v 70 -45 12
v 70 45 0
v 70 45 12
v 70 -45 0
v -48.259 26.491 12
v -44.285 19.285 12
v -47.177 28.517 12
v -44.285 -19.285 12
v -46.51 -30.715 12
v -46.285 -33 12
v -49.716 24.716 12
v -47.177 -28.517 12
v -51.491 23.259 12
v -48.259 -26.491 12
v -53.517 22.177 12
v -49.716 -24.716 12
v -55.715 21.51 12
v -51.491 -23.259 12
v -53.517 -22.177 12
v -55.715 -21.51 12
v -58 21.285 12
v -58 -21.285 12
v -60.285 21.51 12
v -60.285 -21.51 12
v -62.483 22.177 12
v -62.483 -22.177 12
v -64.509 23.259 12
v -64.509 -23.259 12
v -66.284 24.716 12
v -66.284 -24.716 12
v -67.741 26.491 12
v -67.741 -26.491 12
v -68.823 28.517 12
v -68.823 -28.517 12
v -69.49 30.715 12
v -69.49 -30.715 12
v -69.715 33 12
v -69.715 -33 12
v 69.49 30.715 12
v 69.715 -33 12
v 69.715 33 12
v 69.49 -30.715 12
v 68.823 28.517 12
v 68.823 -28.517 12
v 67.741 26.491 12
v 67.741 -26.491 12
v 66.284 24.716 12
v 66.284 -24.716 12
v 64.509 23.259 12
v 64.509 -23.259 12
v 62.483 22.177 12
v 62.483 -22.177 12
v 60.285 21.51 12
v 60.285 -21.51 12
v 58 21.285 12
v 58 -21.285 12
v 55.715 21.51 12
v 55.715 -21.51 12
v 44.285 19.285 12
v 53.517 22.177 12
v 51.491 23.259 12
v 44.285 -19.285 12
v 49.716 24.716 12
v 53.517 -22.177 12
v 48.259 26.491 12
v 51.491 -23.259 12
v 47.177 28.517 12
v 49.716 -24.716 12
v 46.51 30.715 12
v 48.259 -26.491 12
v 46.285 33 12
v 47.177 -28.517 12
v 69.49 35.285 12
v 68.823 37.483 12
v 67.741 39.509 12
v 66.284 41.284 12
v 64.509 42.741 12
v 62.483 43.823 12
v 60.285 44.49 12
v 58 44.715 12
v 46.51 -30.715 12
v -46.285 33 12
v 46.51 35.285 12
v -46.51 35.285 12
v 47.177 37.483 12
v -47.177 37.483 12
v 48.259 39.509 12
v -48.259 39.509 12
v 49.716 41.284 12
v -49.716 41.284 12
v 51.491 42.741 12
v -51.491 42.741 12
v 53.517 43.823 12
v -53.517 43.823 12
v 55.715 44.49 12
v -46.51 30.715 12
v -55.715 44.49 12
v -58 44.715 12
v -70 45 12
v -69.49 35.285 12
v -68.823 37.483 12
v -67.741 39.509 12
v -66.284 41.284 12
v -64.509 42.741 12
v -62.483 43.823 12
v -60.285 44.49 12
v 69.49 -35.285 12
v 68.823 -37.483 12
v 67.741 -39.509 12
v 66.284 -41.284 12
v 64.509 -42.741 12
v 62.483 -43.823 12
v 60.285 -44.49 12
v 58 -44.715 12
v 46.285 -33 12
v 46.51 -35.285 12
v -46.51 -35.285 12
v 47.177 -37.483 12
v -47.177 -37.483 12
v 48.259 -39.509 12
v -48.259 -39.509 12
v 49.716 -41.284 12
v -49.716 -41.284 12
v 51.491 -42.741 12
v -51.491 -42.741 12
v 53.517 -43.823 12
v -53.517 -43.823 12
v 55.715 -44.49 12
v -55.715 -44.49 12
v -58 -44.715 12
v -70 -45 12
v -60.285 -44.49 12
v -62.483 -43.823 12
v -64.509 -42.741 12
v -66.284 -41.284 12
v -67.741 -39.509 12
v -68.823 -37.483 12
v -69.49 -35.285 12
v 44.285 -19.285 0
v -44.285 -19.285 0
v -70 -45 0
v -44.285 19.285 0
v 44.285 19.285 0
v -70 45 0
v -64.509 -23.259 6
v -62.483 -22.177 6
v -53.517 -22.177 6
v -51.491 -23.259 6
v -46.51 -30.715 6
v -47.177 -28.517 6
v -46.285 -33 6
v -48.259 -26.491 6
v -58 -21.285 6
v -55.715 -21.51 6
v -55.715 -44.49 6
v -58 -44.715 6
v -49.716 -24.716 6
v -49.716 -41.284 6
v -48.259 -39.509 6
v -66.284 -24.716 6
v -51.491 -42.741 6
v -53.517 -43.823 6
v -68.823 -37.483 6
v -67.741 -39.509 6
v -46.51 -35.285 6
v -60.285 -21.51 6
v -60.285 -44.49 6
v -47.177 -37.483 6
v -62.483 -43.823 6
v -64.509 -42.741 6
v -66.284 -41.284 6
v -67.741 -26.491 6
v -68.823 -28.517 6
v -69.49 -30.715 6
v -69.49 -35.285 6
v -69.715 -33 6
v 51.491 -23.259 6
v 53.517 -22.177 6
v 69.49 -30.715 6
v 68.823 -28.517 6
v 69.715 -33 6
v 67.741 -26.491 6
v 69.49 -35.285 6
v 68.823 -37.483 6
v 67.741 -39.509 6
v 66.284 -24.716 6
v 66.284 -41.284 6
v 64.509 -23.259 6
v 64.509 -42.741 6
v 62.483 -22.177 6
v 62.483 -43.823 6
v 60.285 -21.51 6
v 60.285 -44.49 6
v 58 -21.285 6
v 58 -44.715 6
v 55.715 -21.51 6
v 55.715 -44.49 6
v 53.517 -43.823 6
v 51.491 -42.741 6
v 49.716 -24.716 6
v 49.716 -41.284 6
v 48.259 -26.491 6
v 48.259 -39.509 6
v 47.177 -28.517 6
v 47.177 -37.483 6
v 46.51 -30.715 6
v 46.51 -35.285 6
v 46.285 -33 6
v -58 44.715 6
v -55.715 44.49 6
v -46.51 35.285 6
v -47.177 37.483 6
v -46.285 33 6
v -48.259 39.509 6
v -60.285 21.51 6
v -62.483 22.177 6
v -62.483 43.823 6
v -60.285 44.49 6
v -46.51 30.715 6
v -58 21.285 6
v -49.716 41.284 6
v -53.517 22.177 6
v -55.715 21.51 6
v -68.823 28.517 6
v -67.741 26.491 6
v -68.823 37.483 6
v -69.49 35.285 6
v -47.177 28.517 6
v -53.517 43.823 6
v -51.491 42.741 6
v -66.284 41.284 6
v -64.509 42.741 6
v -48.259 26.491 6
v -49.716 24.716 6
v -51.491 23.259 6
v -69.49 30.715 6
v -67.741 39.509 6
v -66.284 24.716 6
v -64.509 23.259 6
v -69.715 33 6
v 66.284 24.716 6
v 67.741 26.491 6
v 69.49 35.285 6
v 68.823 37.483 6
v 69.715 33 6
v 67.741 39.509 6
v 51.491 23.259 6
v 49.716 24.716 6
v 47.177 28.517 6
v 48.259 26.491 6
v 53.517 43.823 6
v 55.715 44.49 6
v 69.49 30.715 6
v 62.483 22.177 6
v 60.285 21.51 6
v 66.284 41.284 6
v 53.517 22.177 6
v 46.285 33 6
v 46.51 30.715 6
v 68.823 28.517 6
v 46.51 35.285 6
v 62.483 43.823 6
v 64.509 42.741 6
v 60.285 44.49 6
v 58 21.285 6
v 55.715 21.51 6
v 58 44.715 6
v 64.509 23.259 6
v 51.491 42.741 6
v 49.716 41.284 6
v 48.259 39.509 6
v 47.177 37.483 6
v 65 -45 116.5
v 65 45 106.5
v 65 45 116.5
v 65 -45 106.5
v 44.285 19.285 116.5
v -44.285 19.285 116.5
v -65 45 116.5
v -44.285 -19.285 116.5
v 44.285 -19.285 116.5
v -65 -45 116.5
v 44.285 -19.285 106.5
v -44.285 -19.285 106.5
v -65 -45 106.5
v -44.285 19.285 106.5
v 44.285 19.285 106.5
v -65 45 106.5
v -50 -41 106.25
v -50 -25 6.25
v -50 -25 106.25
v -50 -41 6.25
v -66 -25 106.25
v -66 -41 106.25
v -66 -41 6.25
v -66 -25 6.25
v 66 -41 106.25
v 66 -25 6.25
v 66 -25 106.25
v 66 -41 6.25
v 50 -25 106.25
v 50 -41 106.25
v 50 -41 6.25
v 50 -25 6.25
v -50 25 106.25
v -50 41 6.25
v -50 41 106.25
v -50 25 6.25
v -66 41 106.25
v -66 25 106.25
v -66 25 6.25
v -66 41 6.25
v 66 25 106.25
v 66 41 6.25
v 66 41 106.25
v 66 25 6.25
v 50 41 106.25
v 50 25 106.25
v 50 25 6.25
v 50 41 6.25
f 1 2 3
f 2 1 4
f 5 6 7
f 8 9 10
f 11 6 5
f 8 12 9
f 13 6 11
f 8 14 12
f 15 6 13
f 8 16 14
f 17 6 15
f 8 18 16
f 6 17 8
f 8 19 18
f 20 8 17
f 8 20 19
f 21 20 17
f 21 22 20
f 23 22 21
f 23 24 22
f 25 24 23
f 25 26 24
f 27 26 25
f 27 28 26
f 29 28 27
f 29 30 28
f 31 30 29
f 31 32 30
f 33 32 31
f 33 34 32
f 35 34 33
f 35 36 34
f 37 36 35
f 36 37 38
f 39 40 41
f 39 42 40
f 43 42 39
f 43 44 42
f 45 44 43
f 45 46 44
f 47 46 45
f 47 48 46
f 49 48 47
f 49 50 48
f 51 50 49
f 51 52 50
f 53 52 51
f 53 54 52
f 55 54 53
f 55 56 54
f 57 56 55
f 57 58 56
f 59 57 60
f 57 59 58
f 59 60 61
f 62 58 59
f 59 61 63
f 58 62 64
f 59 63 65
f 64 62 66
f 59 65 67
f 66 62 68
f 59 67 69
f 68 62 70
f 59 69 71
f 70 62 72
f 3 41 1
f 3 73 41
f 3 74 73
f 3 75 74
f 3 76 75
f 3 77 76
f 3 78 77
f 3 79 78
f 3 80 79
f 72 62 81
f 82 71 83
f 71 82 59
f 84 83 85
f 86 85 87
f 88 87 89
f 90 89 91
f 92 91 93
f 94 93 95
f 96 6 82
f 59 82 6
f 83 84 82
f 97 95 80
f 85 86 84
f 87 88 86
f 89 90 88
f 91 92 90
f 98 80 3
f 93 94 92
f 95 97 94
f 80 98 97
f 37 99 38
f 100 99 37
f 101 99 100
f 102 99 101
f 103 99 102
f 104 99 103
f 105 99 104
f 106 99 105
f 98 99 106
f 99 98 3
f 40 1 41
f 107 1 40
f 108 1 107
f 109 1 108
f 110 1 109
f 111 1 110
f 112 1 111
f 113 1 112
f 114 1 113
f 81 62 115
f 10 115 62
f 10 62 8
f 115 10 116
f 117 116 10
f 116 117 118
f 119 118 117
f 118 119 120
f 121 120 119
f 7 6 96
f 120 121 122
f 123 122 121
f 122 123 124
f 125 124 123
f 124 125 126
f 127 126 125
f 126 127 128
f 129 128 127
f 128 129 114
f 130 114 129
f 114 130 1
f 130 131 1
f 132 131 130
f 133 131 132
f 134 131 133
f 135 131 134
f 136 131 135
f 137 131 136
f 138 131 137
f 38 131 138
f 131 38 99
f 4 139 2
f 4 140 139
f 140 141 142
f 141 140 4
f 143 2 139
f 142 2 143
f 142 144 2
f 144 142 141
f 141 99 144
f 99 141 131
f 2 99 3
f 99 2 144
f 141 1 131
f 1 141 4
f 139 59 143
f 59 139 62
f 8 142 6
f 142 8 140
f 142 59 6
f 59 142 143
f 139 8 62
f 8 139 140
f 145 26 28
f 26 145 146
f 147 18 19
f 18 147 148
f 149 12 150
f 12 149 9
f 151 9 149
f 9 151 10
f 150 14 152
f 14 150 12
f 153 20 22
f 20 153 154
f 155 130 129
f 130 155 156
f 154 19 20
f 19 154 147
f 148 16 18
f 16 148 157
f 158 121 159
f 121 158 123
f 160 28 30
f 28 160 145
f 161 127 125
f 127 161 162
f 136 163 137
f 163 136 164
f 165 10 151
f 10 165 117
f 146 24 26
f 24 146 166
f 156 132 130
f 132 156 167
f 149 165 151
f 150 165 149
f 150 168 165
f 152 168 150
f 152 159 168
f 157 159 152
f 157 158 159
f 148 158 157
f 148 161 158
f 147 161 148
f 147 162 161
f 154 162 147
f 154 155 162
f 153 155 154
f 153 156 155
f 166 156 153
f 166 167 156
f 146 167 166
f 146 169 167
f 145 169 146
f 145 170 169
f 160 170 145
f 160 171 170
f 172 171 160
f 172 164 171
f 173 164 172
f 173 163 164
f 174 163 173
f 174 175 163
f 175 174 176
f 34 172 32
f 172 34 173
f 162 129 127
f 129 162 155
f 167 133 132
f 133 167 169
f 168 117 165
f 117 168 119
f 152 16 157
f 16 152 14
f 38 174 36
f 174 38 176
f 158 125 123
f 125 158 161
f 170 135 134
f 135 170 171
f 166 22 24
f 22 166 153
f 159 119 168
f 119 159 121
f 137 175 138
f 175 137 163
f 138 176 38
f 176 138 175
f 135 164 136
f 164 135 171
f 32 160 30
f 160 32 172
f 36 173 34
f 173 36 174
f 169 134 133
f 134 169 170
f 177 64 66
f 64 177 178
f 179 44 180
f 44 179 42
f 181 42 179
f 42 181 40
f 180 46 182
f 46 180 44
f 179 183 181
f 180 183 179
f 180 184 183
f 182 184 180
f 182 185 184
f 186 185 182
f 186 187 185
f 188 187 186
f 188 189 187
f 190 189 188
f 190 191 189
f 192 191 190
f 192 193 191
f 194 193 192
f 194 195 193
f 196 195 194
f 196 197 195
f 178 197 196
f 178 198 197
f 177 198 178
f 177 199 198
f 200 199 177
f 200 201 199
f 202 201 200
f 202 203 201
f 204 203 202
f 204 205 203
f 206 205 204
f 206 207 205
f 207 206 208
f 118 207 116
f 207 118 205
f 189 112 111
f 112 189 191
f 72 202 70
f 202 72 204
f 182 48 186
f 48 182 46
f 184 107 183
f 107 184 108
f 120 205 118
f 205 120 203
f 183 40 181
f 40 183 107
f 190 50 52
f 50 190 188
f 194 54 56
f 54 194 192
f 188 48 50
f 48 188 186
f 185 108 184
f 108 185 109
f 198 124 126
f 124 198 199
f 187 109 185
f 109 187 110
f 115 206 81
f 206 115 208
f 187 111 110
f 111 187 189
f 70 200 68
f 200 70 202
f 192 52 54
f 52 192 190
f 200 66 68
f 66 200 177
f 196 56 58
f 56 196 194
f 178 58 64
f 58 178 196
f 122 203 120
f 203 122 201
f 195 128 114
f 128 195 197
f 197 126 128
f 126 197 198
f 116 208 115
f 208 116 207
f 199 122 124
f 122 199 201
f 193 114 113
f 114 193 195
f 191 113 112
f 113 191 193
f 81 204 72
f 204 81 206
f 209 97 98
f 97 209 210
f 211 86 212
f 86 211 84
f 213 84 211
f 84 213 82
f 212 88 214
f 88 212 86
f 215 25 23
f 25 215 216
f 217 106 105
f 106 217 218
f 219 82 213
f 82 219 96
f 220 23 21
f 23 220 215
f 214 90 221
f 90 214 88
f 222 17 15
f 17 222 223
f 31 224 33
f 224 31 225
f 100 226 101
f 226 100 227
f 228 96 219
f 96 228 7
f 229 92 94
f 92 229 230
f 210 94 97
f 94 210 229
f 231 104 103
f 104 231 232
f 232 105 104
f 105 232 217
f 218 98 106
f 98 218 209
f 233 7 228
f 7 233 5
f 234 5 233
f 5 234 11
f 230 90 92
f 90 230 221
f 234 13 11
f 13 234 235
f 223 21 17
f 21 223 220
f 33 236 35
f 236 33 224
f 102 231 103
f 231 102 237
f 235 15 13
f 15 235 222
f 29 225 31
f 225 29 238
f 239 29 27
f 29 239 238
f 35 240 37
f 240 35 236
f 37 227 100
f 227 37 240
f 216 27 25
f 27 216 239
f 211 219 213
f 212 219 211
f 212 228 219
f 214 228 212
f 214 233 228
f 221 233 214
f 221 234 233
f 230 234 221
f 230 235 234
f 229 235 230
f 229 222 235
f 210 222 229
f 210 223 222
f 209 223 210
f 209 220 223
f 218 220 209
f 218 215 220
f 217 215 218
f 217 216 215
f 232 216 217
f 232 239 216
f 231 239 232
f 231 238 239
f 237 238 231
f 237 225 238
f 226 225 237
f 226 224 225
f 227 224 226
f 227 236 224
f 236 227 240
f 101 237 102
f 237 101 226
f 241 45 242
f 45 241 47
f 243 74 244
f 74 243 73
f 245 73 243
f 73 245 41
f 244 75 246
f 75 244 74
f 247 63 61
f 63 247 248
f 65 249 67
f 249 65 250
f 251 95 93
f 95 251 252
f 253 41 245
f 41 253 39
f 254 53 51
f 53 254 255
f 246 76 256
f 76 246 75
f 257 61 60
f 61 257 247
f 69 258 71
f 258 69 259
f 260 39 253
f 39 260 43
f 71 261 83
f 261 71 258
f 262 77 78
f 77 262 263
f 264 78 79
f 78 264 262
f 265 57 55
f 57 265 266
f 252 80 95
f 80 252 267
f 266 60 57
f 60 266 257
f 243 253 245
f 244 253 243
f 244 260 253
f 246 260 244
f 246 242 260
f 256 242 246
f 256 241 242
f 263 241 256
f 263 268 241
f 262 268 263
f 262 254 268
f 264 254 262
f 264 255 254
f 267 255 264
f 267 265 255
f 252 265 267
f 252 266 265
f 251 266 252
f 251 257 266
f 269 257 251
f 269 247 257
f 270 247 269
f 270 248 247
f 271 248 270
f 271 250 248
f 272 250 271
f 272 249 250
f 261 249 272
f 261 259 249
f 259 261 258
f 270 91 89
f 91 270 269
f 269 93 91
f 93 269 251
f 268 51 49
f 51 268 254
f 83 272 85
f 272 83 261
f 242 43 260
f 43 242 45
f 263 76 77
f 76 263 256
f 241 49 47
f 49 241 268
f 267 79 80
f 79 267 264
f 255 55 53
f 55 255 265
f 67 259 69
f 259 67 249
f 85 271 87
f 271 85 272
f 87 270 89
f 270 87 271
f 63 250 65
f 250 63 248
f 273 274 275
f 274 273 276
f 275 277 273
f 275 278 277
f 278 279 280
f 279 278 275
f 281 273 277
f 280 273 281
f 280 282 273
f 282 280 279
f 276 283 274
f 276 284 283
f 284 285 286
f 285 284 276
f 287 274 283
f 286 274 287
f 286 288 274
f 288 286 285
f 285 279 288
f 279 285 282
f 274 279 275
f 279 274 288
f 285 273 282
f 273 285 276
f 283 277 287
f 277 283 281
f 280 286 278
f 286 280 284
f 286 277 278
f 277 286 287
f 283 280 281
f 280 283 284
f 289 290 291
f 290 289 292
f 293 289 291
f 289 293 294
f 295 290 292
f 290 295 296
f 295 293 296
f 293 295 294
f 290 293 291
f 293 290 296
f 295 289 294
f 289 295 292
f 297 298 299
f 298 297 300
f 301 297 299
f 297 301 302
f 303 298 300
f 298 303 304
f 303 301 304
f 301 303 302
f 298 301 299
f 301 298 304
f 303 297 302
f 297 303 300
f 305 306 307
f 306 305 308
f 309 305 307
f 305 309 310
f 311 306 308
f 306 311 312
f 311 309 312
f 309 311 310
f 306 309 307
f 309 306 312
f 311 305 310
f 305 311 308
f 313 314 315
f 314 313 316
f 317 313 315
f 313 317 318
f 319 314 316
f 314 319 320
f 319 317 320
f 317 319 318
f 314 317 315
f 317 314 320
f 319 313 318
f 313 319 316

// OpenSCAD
$fn = 32;

// ------------------------------------------------------------------------
// Frame cube: base 140 x 90 mm, posts 100 mm tall
// Every part is its own module, assembly() places every instance.
// ------------------------------------------------------------------------

// --- part 1 ---
module base_frame() {
  difference() {
    translate([-70, -45, 0]) cube([140, 90, 12]);
    translate([-44.285, -19.285, -1]) cube([88.57, 38.57, 14]);
    translate([-58, -33, 6]) cylinder(h = 7, d = 23.43);
    translate([58, -33, 6]) cylinder(h = 7, d = 23.43);
    translate([-58, 33, 6]) cylinder(h = 7, d = 23.43);
    translate([58, 33, 6]) cylinder(h = 7, d = 23.43);
  }
}

// --- part 2 ---
module corner_post() {
  translate([-8, -8, 0]) cube([16, 16, 100]);
}

// --- part 3 ---
module top_frame() {
  difference() {
    translate([-65, -45, 0]) cube([130, 90, 10]);
    translate([-44.285, -19.285, -1]) cube([88.57, 38.57, 12]);
  }
}

// --- assembly ---
module assembly() {
  color([0.80, 0.24, 0.20]) translate([0, 0, 0]) rotate([0, 0, 0]) base_frame();
  color([0.20, 0.45, 0.75]) translate([-58, -33, 6.25]) rotate([0, 0, 0]) corner_post();
  color([0.25, 0.62, 0.32]) translate([58, -33, 6.25]) rotate([0, 0, 0]) corner_post();
  color([0.92, 0.70, 0.18]) translate([-58, 33, 6.25]) rotate([0, 0, 0]) corner_post();
  color([0.58, 0.35, 0.70]) translate([58, 33, 6.25]) rotate([0, 0, 0]) corner_post();
  color([0.16, 0.66, 0.66]) translate([0, 0, 106.5]) rotate([0, 0, 0]) top_frame();
}

assembly();
